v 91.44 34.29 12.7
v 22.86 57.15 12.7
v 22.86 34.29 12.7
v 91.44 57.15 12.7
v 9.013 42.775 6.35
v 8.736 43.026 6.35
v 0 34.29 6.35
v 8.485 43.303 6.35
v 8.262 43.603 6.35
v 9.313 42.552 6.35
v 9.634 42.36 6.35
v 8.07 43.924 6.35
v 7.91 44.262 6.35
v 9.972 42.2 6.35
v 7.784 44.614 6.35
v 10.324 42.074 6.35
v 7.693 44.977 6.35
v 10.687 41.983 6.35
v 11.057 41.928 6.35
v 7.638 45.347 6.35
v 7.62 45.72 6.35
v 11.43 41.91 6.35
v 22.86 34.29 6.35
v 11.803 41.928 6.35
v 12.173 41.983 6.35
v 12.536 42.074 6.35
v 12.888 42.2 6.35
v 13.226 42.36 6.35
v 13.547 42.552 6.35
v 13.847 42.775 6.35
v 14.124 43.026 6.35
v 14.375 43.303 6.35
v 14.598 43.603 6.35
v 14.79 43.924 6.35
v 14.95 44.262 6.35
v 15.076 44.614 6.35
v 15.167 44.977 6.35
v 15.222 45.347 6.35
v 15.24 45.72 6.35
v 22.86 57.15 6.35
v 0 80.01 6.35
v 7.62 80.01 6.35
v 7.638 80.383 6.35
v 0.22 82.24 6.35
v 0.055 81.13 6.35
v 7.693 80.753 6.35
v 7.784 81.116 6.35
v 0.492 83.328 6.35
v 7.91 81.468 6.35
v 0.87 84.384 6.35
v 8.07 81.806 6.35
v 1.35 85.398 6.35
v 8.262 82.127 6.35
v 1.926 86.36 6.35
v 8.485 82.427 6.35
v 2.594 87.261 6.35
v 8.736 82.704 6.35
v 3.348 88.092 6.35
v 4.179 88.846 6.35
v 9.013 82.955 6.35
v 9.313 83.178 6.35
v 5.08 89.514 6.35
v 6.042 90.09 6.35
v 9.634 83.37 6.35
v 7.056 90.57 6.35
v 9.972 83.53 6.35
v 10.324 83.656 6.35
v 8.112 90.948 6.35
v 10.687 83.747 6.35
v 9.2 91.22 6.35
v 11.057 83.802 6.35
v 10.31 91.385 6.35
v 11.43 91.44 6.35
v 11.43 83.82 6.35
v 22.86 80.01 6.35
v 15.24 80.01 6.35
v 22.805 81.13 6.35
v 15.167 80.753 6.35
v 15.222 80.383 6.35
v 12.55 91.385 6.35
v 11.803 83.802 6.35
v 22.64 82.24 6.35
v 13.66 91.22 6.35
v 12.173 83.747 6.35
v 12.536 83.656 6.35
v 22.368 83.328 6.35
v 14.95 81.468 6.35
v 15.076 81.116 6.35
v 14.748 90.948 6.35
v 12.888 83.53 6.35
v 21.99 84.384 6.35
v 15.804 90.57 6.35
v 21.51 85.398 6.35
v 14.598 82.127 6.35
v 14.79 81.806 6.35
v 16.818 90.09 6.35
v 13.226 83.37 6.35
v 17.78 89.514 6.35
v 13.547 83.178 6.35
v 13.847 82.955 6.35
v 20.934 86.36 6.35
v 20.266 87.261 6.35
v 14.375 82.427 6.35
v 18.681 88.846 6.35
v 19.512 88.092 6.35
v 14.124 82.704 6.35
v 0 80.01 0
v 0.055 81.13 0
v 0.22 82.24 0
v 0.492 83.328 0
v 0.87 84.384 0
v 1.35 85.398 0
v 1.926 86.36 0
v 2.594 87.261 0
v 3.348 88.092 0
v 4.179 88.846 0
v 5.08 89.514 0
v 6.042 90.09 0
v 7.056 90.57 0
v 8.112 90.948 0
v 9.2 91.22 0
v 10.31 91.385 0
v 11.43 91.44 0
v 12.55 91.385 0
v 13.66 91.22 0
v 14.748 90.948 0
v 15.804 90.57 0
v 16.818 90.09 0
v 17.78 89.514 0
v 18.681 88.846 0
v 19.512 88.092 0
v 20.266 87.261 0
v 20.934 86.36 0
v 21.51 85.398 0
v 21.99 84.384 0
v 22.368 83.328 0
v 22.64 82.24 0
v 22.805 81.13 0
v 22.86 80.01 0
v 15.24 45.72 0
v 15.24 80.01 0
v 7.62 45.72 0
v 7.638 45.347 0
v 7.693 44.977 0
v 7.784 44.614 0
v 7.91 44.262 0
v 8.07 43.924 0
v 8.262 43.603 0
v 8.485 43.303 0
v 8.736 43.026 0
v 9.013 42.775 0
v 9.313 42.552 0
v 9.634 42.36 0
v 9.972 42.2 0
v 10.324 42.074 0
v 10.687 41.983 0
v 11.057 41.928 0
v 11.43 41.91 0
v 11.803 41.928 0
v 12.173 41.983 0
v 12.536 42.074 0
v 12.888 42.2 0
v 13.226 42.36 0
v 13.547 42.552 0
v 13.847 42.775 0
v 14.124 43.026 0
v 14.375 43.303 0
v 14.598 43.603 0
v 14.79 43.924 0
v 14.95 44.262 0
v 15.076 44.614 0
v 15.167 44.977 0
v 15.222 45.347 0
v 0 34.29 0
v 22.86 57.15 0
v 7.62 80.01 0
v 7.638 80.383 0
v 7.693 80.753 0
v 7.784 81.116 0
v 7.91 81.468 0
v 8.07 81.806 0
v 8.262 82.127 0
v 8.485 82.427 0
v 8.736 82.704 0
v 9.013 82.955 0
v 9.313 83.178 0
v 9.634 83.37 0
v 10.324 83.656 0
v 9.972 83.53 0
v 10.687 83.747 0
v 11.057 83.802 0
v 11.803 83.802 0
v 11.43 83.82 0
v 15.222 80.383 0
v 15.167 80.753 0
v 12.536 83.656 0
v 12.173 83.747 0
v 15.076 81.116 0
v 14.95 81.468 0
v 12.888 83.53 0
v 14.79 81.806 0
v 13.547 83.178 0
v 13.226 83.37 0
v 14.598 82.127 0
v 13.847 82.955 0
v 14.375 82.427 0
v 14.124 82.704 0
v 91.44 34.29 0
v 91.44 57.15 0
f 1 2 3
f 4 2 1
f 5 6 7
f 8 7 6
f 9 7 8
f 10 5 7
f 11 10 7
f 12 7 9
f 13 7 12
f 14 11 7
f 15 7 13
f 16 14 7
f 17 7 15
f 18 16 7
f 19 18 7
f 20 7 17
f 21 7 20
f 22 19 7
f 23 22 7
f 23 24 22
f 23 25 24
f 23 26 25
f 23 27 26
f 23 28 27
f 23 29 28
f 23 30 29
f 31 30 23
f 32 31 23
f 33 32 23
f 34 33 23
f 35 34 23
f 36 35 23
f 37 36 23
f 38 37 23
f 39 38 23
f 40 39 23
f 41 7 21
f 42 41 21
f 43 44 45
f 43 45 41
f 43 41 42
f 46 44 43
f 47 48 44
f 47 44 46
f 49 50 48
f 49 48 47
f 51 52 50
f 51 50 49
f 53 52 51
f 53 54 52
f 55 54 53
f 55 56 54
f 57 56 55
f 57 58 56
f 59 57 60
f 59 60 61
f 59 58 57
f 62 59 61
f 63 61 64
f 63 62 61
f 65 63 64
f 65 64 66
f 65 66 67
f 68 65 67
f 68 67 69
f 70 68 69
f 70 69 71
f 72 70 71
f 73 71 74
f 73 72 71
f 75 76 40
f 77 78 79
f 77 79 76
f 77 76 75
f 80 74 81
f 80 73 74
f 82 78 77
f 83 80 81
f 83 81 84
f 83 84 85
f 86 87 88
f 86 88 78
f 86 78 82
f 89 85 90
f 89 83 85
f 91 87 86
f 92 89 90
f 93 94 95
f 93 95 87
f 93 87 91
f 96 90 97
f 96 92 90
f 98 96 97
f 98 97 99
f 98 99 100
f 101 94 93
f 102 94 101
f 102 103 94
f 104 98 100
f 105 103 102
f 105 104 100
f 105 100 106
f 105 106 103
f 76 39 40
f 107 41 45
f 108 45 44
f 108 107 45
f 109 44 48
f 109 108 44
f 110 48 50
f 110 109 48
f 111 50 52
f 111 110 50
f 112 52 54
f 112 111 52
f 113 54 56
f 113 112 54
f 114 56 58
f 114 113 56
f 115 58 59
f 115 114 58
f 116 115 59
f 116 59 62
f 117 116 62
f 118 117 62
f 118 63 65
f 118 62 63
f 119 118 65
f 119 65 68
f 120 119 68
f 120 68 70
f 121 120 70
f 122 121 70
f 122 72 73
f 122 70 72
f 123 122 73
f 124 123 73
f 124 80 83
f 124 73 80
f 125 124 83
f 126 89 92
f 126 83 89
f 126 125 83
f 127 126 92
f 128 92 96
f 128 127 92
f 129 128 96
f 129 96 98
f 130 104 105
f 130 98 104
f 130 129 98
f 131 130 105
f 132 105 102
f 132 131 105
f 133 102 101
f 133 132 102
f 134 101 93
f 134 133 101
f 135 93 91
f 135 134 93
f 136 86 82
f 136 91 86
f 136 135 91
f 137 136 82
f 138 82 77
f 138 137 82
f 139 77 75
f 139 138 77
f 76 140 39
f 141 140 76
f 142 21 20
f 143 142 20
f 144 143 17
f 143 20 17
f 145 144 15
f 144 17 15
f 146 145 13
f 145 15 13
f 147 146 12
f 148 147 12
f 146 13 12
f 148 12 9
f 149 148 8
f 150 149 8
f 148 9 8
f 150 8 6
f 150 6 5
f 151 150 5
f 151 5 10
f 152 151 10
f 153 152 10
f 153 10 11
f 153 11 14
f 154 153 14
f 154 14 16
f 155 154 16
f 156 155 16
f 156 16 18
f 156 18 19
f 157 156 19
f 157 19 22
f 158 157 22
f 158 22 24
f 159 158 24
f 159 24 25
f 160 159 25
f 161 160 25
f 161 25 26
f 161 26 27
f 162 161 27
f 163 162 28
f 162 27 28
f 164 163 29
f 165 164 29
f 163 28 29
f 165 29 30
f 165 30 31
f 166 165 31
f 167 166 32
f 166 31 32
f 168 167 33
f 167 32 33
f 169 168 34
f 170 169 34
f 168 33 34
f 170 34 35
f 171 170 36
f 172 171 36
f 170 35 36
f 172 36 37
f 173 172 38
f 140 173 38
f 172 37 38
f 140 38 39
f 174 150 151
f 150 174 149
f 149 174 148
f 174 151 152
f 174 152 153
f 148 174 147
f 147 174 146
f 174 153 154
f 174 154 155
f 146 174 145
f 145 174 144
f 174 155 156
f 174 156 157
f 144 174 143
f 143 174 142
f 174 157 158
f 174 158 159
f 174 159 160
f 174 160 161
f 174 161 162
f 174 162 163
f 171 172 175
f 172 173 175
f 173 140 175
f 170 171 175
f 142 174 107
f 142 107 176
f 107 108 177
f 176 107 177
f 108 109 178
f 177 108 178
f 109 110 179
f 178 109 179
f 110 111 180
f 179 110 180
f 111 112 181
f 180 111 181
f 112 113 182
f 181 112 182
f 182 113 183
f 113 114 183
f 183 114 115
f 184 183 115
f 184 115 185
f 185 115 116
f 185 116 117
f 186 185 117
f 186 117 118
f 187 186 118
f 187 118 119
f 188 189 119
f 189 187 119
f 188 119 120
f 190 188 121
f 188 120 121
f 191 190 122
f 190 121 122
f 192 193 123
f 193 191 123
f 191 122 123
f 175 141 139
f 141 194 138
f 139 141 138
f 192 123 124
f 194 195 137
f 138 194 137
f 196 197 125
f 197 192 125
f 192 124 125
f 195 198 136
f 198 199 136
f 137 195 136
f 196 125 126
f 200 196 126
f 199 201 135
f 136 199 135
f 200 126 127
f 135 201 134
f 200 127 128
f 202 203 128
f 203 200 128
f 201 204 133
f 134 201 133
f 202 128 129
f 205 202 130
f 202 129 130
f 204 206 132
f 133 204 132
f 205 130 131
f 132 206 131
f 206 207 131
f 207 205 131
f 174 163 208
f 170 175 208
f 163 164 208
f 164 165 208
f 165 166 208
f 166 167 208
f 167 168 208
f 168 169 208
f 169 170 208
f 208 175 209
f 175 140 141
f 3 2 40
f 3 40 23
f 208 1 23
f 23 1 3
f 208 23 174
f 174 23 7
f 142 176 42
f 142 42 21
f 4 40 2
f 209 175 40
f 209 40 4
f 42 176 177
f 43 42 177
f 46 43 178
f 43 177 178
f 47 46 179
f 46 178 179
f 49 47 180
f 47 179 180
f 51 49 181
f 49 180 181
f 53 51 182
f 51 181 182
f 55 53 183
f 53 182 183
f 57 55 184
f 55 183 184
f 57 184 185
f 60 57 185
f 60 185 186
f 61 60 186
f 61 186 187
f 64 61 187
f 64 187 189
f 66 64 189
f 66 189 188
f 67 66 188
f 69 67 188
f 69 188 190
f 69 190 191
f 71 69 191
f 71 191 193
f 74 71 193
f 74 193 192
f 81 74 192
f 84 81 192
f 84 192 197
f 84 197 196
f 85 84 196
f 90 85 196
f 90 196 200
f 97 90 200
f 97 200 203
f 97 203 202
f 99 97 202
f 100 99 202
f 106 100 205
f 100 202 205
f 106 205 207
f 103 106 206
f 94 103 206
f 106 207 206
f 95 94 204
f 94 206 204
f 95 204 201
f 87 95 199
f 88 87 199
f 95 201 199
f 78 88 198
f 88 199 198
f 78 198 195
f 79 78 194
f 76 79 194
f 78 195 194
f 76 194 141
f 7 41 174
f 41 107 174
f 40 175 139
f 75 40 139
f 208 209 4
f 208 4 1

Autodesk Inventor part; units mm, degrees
ref_plane "YZ Plane" through (0, 0, 0) normal (1, 0, 0) x (0, 1, 0)
ref_plane "XZ Plane" through (0, 0, 0) normal (0, 1, 0) x (-1, 0, 0)
ref_plane "XY Plane" through (0, 0, 0) normal (0, 0, 1) x (1, 0, 0)
sketch "Sketch1" plane through (0, 0, 0) normal (0, 0, 1) x (1, 0, 0)
  line L0 (0, 0) -> (22.86, 0)
  line L1 (22.86, 0) -> (22.86, 91.44)
  line L2 (22.86, 91.44) -> (0, 91.44)
  line L3 (0, 91.44) -> (0, 0)
  line L4 (22.86, 57.15) -> (91.44, 57.15)
  line L5 (91.44, 57.15) -> (91.44, 34.29)
  line L6 (91.44, 34.29) -> (22.86, 34.29)
  line L7 (22.86, 34.29) -> (22.86, 57.15)
  line L8 (11.43, 80.01) -> (11.43, 11.43) construction
  line L9 (7.62, 80.01) -> (7.62, 11.43)
  line L10 (15.24, 11.43) -> (15.24, 80.01)
  arc A0 (15.24, 80.01) -> (7.62, 80.01) centre (11.43, 80.01) ccw
  arc A1 (7.62, 11.43) -> (15.24, 11.43) centre (11.43, 11.43) ccw
  arc A2 (22.86, 80.01) -> (0, 80.01) centre (11.43, 80.01) ccw
  arc A3 (0, 11.43) -> (22.86, 11.43) centre (11.43, 11.43) ccw
  point P0 (11.43, 45.72)
  point P1 (-17.5605, -7.6237)
  dimension "d0" = 22.86
  dimension "d1" = 91.44
  dimension "d2" = 68.58
  dimension "d3" = 22.86
  dimension "d4" = 34.29
  dimension "d5" = 68.58
  dimension "d6" = 7.62
  dimension "d7" = 11.43
  dimension "d8" = 11.43
  dimension "d9" = 0
  dimension "d10" = 0
extrude "Extrusion1" add sketch "Sketch1" along normal blind 12.7 contours A3 L3 A2 L1 | L1 L4 L5 L6
sketch "Sketch2" plane through (0, 0, 12.7) normal (0, 0, 1) x (1, 0, 0)
  line L0 (22.86, 0) -> (0, 0)
  line L1 (0, 0) -> (0, 91.44)
  line L2 (0, 91.44) -> (22.86, 91.44)
  line L3 (22.86, 91.44) -> (22.86, 0)
  line L4 (0, 80.01) -> (0, 11.43) projected
  line L5 (22.86, 57.15) -> (22.86, 80.01) projected
  arc A0 (22.86, 80.01) -> (0, 80.01) centre (11.43, 80.01) ccw projected
  arc A1 (0, 11.43) -> (22.86, 11.43) centre (11.43, 11.43) ccw projected
  point P0 (0, 0)
  point P1 (0, 11.43)
  dimension "d13" = 0
  dimension "d14" = 0
extrude "Extrusion2" cut sketch "Sketch2" against normal blind 6.35 contours A1 L1 A0 L3
sketch "Sketch3" plane through (0, 0, 6.35) normal (0, 0, 1) x (1, 0, 0)
  line L0 (22.86, 34.29) -> (91.44, 34.29) projected
  line L1 (22.86, 34.29) -> (0, 34.29)
  line L2 (0, 34.29) -> (0, 0)
  line L3 (0, 0) -> (22.86, 0)
  line L4 (22.86, 0) -> (22.86, 34.29)
  line L5 (0, 11.43) -> (0, 80.01) projected
  arc A0 (0, 11.43) -> (22.86, 11.43) centre (11.43, 11.43) ccw projected
  point P0 (0, 0)
  dimension "d17" = 0
extrude "Extrusion3" cut sketch "Sketch3" against normal blind 107.95 contours L4 A0 L2 L1
sketch "Sketch4" plane through (0, 0, 6.35) normal (0, 0, 1) x (1, 0, 0)
  line L0 (22.86, 34.29) -> (0, 34.29)
  line L1 (0, 34.29) -> (0, 41.91)
  line L2 (22.86, 41.91) -> (22.86, 34.29)
  arc A0 (7.62, 45.72) -> (15.24, 45.72) centre (11.43, 45.72) ccw
  line L3 (15.24, 34.29) -> (15.24, 80.01) projected
  line L4 (15.24, 41.91) -> (15.24, 45.72)
  line L5 (7.62, 80.01) -> (7.62, 34.29) projected
  line L6 (7.62, 41.91) -> (7.62, 45.72)
  line L7 (0, 41.91) -> (7.62, 41.91)
  line L8 (15.24, 41.91) -> (22.86, 41.91)
  point P0 (0, 0)
  dimension "d20" = 22.86
  dimension "d21" = 7.62
  dimension "d22" = 7.62
extrude "Extrusion4" add sketch "Sketch4" against normal blind 6.35 contours L0 L5 A0 L3
properties part number "Slider2"
